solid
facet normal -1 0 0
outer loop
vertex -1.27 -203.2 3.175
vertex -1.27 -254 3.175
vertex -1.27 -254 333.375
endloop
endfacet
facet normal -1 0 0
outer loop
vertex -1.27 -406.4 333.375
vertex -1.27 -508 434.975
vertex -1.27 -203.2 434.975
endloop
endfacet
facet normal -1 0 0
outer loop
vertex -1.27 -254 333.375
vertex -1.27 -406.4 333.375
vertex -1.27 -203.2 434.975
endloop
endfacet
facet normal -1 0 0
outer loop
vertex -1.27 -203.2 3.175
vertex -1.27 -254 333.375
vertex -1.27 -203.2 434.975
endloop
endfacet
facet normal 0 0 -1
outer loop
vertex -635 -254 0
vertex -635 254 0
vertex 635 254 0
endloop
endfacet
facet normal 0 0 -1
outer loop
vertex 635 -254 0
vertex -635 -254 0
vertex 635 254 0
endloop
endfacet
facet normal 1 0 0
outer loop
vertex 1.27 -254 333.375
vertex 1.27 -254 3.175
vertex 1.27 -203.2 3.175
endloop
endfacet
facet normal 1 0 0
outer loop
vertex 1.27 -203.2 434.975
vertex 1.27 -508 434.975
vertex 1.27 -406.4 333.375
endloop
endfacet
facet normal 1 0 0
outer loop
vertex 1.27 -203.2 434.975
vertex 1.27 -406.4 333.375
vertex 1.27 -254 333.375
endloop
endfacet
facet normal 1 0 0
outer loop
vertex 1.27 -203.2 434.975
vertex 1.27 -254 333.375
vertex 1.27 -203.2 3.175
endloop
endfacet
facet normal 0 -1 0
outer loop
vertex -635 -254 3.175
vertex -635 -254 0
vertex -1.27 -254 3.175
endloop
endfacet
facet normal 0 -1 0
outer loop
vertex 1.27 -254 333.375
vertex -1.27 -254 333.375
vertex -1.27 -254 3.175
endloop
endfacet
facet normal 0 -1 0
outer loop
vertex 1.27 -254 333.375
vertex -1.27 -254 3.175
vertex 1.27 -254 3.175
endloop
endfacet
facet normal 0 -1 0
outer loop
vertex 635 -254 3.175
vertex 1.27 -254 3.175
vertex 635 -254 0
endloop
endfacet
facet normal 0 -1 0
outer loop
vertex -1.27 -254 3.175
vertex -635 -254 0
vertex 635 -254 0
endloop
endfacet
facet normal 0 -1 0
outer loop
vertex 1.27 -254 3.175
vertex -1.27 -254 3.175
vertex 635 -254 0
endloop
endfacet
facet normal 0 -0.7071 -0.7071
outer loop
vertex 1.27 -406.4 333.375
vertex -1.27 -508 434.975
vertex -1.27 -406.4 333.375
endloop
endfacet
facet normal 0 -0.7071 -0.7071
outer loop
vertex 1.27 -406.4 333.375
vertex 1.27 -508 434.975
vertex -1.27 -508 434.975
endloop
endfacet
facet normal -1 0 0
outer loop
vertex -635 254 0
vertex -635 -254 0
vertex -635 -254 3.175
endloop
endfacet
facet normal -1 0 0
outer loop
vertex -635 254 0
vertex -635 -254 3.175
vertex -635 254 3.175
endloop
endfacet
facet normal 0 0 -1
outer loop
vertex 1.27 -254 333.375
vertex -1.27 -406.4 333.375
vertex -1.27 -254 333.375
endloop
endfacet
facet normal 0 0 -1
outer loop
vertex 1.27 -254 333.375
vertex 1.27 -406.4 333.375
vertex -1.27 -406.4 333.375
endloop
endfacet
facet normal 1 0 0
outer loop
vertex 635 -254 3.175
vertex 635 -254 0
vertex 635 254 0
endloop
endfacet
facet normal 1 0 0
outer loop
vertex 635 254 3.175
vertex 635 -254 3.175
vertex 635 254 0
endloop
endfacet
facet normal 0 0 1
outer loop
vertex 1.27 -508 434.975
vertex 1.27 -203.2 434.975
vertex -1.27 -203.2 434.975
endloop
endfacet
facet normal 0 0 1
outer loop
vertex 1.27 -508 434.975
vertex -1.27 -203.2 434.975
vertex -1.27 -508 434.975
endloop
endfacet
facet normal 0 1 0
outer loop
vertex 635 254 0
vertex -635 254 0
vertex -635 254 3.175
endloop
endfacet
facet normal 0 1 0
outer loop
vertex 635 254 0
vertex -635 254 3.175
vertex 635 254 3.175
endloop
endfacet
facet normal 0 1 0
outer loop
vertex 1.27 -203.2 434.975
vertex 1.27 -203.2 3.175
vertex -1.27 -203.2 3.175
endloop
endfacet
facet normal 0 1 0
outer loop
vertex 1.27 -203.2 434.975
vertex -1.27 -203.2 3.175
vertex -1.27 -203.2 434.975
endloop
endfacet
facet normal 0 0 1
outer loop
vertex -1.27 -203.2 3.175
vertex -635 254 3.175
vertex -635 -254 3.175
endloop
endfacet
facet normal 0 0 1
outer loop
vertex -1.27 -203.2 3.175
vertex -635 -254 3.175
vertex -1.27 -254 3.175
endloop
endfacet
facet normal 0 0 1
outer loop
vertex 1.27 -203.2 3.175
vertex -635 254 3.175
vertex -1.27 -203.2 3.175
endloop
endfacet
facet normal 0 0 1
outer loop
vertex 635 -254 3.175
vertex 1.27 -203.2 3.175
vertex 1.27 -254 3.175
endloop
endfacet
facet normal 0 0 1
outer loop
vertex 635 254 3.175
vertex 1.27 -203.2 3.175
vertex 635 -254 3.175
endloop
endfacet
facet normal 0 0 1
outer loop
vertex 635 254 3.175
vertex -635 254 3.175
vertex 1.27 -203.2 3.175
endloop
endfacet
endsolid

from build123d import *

# Parameters (mm, degrees)
F0_W     = 1270
F0_H     = 508
F1_DEPTH = 3.175
F3_DEPTH = 1.27


with BuildPart() as f1:
    # F0 (on Top) → F1 (new body)
    with BuildSketch(Plane.XY):
        Rectangle(F0_W, F0_H)
    extrude(amount=F1_DEPTH)

    # F2 (on Right) → F3 (join, symmetric)
    with BuildSketch(Plane.YZ):
        Polygon((-254, 333.375), (-254, 3.175), (-203.2, 3.175), (-203.2, 434.975), (-508, 434.975), (-406.4, 333.375), align=None)
    extrude(amount=F3_DEPTH, both=True)


solid = f1.part
